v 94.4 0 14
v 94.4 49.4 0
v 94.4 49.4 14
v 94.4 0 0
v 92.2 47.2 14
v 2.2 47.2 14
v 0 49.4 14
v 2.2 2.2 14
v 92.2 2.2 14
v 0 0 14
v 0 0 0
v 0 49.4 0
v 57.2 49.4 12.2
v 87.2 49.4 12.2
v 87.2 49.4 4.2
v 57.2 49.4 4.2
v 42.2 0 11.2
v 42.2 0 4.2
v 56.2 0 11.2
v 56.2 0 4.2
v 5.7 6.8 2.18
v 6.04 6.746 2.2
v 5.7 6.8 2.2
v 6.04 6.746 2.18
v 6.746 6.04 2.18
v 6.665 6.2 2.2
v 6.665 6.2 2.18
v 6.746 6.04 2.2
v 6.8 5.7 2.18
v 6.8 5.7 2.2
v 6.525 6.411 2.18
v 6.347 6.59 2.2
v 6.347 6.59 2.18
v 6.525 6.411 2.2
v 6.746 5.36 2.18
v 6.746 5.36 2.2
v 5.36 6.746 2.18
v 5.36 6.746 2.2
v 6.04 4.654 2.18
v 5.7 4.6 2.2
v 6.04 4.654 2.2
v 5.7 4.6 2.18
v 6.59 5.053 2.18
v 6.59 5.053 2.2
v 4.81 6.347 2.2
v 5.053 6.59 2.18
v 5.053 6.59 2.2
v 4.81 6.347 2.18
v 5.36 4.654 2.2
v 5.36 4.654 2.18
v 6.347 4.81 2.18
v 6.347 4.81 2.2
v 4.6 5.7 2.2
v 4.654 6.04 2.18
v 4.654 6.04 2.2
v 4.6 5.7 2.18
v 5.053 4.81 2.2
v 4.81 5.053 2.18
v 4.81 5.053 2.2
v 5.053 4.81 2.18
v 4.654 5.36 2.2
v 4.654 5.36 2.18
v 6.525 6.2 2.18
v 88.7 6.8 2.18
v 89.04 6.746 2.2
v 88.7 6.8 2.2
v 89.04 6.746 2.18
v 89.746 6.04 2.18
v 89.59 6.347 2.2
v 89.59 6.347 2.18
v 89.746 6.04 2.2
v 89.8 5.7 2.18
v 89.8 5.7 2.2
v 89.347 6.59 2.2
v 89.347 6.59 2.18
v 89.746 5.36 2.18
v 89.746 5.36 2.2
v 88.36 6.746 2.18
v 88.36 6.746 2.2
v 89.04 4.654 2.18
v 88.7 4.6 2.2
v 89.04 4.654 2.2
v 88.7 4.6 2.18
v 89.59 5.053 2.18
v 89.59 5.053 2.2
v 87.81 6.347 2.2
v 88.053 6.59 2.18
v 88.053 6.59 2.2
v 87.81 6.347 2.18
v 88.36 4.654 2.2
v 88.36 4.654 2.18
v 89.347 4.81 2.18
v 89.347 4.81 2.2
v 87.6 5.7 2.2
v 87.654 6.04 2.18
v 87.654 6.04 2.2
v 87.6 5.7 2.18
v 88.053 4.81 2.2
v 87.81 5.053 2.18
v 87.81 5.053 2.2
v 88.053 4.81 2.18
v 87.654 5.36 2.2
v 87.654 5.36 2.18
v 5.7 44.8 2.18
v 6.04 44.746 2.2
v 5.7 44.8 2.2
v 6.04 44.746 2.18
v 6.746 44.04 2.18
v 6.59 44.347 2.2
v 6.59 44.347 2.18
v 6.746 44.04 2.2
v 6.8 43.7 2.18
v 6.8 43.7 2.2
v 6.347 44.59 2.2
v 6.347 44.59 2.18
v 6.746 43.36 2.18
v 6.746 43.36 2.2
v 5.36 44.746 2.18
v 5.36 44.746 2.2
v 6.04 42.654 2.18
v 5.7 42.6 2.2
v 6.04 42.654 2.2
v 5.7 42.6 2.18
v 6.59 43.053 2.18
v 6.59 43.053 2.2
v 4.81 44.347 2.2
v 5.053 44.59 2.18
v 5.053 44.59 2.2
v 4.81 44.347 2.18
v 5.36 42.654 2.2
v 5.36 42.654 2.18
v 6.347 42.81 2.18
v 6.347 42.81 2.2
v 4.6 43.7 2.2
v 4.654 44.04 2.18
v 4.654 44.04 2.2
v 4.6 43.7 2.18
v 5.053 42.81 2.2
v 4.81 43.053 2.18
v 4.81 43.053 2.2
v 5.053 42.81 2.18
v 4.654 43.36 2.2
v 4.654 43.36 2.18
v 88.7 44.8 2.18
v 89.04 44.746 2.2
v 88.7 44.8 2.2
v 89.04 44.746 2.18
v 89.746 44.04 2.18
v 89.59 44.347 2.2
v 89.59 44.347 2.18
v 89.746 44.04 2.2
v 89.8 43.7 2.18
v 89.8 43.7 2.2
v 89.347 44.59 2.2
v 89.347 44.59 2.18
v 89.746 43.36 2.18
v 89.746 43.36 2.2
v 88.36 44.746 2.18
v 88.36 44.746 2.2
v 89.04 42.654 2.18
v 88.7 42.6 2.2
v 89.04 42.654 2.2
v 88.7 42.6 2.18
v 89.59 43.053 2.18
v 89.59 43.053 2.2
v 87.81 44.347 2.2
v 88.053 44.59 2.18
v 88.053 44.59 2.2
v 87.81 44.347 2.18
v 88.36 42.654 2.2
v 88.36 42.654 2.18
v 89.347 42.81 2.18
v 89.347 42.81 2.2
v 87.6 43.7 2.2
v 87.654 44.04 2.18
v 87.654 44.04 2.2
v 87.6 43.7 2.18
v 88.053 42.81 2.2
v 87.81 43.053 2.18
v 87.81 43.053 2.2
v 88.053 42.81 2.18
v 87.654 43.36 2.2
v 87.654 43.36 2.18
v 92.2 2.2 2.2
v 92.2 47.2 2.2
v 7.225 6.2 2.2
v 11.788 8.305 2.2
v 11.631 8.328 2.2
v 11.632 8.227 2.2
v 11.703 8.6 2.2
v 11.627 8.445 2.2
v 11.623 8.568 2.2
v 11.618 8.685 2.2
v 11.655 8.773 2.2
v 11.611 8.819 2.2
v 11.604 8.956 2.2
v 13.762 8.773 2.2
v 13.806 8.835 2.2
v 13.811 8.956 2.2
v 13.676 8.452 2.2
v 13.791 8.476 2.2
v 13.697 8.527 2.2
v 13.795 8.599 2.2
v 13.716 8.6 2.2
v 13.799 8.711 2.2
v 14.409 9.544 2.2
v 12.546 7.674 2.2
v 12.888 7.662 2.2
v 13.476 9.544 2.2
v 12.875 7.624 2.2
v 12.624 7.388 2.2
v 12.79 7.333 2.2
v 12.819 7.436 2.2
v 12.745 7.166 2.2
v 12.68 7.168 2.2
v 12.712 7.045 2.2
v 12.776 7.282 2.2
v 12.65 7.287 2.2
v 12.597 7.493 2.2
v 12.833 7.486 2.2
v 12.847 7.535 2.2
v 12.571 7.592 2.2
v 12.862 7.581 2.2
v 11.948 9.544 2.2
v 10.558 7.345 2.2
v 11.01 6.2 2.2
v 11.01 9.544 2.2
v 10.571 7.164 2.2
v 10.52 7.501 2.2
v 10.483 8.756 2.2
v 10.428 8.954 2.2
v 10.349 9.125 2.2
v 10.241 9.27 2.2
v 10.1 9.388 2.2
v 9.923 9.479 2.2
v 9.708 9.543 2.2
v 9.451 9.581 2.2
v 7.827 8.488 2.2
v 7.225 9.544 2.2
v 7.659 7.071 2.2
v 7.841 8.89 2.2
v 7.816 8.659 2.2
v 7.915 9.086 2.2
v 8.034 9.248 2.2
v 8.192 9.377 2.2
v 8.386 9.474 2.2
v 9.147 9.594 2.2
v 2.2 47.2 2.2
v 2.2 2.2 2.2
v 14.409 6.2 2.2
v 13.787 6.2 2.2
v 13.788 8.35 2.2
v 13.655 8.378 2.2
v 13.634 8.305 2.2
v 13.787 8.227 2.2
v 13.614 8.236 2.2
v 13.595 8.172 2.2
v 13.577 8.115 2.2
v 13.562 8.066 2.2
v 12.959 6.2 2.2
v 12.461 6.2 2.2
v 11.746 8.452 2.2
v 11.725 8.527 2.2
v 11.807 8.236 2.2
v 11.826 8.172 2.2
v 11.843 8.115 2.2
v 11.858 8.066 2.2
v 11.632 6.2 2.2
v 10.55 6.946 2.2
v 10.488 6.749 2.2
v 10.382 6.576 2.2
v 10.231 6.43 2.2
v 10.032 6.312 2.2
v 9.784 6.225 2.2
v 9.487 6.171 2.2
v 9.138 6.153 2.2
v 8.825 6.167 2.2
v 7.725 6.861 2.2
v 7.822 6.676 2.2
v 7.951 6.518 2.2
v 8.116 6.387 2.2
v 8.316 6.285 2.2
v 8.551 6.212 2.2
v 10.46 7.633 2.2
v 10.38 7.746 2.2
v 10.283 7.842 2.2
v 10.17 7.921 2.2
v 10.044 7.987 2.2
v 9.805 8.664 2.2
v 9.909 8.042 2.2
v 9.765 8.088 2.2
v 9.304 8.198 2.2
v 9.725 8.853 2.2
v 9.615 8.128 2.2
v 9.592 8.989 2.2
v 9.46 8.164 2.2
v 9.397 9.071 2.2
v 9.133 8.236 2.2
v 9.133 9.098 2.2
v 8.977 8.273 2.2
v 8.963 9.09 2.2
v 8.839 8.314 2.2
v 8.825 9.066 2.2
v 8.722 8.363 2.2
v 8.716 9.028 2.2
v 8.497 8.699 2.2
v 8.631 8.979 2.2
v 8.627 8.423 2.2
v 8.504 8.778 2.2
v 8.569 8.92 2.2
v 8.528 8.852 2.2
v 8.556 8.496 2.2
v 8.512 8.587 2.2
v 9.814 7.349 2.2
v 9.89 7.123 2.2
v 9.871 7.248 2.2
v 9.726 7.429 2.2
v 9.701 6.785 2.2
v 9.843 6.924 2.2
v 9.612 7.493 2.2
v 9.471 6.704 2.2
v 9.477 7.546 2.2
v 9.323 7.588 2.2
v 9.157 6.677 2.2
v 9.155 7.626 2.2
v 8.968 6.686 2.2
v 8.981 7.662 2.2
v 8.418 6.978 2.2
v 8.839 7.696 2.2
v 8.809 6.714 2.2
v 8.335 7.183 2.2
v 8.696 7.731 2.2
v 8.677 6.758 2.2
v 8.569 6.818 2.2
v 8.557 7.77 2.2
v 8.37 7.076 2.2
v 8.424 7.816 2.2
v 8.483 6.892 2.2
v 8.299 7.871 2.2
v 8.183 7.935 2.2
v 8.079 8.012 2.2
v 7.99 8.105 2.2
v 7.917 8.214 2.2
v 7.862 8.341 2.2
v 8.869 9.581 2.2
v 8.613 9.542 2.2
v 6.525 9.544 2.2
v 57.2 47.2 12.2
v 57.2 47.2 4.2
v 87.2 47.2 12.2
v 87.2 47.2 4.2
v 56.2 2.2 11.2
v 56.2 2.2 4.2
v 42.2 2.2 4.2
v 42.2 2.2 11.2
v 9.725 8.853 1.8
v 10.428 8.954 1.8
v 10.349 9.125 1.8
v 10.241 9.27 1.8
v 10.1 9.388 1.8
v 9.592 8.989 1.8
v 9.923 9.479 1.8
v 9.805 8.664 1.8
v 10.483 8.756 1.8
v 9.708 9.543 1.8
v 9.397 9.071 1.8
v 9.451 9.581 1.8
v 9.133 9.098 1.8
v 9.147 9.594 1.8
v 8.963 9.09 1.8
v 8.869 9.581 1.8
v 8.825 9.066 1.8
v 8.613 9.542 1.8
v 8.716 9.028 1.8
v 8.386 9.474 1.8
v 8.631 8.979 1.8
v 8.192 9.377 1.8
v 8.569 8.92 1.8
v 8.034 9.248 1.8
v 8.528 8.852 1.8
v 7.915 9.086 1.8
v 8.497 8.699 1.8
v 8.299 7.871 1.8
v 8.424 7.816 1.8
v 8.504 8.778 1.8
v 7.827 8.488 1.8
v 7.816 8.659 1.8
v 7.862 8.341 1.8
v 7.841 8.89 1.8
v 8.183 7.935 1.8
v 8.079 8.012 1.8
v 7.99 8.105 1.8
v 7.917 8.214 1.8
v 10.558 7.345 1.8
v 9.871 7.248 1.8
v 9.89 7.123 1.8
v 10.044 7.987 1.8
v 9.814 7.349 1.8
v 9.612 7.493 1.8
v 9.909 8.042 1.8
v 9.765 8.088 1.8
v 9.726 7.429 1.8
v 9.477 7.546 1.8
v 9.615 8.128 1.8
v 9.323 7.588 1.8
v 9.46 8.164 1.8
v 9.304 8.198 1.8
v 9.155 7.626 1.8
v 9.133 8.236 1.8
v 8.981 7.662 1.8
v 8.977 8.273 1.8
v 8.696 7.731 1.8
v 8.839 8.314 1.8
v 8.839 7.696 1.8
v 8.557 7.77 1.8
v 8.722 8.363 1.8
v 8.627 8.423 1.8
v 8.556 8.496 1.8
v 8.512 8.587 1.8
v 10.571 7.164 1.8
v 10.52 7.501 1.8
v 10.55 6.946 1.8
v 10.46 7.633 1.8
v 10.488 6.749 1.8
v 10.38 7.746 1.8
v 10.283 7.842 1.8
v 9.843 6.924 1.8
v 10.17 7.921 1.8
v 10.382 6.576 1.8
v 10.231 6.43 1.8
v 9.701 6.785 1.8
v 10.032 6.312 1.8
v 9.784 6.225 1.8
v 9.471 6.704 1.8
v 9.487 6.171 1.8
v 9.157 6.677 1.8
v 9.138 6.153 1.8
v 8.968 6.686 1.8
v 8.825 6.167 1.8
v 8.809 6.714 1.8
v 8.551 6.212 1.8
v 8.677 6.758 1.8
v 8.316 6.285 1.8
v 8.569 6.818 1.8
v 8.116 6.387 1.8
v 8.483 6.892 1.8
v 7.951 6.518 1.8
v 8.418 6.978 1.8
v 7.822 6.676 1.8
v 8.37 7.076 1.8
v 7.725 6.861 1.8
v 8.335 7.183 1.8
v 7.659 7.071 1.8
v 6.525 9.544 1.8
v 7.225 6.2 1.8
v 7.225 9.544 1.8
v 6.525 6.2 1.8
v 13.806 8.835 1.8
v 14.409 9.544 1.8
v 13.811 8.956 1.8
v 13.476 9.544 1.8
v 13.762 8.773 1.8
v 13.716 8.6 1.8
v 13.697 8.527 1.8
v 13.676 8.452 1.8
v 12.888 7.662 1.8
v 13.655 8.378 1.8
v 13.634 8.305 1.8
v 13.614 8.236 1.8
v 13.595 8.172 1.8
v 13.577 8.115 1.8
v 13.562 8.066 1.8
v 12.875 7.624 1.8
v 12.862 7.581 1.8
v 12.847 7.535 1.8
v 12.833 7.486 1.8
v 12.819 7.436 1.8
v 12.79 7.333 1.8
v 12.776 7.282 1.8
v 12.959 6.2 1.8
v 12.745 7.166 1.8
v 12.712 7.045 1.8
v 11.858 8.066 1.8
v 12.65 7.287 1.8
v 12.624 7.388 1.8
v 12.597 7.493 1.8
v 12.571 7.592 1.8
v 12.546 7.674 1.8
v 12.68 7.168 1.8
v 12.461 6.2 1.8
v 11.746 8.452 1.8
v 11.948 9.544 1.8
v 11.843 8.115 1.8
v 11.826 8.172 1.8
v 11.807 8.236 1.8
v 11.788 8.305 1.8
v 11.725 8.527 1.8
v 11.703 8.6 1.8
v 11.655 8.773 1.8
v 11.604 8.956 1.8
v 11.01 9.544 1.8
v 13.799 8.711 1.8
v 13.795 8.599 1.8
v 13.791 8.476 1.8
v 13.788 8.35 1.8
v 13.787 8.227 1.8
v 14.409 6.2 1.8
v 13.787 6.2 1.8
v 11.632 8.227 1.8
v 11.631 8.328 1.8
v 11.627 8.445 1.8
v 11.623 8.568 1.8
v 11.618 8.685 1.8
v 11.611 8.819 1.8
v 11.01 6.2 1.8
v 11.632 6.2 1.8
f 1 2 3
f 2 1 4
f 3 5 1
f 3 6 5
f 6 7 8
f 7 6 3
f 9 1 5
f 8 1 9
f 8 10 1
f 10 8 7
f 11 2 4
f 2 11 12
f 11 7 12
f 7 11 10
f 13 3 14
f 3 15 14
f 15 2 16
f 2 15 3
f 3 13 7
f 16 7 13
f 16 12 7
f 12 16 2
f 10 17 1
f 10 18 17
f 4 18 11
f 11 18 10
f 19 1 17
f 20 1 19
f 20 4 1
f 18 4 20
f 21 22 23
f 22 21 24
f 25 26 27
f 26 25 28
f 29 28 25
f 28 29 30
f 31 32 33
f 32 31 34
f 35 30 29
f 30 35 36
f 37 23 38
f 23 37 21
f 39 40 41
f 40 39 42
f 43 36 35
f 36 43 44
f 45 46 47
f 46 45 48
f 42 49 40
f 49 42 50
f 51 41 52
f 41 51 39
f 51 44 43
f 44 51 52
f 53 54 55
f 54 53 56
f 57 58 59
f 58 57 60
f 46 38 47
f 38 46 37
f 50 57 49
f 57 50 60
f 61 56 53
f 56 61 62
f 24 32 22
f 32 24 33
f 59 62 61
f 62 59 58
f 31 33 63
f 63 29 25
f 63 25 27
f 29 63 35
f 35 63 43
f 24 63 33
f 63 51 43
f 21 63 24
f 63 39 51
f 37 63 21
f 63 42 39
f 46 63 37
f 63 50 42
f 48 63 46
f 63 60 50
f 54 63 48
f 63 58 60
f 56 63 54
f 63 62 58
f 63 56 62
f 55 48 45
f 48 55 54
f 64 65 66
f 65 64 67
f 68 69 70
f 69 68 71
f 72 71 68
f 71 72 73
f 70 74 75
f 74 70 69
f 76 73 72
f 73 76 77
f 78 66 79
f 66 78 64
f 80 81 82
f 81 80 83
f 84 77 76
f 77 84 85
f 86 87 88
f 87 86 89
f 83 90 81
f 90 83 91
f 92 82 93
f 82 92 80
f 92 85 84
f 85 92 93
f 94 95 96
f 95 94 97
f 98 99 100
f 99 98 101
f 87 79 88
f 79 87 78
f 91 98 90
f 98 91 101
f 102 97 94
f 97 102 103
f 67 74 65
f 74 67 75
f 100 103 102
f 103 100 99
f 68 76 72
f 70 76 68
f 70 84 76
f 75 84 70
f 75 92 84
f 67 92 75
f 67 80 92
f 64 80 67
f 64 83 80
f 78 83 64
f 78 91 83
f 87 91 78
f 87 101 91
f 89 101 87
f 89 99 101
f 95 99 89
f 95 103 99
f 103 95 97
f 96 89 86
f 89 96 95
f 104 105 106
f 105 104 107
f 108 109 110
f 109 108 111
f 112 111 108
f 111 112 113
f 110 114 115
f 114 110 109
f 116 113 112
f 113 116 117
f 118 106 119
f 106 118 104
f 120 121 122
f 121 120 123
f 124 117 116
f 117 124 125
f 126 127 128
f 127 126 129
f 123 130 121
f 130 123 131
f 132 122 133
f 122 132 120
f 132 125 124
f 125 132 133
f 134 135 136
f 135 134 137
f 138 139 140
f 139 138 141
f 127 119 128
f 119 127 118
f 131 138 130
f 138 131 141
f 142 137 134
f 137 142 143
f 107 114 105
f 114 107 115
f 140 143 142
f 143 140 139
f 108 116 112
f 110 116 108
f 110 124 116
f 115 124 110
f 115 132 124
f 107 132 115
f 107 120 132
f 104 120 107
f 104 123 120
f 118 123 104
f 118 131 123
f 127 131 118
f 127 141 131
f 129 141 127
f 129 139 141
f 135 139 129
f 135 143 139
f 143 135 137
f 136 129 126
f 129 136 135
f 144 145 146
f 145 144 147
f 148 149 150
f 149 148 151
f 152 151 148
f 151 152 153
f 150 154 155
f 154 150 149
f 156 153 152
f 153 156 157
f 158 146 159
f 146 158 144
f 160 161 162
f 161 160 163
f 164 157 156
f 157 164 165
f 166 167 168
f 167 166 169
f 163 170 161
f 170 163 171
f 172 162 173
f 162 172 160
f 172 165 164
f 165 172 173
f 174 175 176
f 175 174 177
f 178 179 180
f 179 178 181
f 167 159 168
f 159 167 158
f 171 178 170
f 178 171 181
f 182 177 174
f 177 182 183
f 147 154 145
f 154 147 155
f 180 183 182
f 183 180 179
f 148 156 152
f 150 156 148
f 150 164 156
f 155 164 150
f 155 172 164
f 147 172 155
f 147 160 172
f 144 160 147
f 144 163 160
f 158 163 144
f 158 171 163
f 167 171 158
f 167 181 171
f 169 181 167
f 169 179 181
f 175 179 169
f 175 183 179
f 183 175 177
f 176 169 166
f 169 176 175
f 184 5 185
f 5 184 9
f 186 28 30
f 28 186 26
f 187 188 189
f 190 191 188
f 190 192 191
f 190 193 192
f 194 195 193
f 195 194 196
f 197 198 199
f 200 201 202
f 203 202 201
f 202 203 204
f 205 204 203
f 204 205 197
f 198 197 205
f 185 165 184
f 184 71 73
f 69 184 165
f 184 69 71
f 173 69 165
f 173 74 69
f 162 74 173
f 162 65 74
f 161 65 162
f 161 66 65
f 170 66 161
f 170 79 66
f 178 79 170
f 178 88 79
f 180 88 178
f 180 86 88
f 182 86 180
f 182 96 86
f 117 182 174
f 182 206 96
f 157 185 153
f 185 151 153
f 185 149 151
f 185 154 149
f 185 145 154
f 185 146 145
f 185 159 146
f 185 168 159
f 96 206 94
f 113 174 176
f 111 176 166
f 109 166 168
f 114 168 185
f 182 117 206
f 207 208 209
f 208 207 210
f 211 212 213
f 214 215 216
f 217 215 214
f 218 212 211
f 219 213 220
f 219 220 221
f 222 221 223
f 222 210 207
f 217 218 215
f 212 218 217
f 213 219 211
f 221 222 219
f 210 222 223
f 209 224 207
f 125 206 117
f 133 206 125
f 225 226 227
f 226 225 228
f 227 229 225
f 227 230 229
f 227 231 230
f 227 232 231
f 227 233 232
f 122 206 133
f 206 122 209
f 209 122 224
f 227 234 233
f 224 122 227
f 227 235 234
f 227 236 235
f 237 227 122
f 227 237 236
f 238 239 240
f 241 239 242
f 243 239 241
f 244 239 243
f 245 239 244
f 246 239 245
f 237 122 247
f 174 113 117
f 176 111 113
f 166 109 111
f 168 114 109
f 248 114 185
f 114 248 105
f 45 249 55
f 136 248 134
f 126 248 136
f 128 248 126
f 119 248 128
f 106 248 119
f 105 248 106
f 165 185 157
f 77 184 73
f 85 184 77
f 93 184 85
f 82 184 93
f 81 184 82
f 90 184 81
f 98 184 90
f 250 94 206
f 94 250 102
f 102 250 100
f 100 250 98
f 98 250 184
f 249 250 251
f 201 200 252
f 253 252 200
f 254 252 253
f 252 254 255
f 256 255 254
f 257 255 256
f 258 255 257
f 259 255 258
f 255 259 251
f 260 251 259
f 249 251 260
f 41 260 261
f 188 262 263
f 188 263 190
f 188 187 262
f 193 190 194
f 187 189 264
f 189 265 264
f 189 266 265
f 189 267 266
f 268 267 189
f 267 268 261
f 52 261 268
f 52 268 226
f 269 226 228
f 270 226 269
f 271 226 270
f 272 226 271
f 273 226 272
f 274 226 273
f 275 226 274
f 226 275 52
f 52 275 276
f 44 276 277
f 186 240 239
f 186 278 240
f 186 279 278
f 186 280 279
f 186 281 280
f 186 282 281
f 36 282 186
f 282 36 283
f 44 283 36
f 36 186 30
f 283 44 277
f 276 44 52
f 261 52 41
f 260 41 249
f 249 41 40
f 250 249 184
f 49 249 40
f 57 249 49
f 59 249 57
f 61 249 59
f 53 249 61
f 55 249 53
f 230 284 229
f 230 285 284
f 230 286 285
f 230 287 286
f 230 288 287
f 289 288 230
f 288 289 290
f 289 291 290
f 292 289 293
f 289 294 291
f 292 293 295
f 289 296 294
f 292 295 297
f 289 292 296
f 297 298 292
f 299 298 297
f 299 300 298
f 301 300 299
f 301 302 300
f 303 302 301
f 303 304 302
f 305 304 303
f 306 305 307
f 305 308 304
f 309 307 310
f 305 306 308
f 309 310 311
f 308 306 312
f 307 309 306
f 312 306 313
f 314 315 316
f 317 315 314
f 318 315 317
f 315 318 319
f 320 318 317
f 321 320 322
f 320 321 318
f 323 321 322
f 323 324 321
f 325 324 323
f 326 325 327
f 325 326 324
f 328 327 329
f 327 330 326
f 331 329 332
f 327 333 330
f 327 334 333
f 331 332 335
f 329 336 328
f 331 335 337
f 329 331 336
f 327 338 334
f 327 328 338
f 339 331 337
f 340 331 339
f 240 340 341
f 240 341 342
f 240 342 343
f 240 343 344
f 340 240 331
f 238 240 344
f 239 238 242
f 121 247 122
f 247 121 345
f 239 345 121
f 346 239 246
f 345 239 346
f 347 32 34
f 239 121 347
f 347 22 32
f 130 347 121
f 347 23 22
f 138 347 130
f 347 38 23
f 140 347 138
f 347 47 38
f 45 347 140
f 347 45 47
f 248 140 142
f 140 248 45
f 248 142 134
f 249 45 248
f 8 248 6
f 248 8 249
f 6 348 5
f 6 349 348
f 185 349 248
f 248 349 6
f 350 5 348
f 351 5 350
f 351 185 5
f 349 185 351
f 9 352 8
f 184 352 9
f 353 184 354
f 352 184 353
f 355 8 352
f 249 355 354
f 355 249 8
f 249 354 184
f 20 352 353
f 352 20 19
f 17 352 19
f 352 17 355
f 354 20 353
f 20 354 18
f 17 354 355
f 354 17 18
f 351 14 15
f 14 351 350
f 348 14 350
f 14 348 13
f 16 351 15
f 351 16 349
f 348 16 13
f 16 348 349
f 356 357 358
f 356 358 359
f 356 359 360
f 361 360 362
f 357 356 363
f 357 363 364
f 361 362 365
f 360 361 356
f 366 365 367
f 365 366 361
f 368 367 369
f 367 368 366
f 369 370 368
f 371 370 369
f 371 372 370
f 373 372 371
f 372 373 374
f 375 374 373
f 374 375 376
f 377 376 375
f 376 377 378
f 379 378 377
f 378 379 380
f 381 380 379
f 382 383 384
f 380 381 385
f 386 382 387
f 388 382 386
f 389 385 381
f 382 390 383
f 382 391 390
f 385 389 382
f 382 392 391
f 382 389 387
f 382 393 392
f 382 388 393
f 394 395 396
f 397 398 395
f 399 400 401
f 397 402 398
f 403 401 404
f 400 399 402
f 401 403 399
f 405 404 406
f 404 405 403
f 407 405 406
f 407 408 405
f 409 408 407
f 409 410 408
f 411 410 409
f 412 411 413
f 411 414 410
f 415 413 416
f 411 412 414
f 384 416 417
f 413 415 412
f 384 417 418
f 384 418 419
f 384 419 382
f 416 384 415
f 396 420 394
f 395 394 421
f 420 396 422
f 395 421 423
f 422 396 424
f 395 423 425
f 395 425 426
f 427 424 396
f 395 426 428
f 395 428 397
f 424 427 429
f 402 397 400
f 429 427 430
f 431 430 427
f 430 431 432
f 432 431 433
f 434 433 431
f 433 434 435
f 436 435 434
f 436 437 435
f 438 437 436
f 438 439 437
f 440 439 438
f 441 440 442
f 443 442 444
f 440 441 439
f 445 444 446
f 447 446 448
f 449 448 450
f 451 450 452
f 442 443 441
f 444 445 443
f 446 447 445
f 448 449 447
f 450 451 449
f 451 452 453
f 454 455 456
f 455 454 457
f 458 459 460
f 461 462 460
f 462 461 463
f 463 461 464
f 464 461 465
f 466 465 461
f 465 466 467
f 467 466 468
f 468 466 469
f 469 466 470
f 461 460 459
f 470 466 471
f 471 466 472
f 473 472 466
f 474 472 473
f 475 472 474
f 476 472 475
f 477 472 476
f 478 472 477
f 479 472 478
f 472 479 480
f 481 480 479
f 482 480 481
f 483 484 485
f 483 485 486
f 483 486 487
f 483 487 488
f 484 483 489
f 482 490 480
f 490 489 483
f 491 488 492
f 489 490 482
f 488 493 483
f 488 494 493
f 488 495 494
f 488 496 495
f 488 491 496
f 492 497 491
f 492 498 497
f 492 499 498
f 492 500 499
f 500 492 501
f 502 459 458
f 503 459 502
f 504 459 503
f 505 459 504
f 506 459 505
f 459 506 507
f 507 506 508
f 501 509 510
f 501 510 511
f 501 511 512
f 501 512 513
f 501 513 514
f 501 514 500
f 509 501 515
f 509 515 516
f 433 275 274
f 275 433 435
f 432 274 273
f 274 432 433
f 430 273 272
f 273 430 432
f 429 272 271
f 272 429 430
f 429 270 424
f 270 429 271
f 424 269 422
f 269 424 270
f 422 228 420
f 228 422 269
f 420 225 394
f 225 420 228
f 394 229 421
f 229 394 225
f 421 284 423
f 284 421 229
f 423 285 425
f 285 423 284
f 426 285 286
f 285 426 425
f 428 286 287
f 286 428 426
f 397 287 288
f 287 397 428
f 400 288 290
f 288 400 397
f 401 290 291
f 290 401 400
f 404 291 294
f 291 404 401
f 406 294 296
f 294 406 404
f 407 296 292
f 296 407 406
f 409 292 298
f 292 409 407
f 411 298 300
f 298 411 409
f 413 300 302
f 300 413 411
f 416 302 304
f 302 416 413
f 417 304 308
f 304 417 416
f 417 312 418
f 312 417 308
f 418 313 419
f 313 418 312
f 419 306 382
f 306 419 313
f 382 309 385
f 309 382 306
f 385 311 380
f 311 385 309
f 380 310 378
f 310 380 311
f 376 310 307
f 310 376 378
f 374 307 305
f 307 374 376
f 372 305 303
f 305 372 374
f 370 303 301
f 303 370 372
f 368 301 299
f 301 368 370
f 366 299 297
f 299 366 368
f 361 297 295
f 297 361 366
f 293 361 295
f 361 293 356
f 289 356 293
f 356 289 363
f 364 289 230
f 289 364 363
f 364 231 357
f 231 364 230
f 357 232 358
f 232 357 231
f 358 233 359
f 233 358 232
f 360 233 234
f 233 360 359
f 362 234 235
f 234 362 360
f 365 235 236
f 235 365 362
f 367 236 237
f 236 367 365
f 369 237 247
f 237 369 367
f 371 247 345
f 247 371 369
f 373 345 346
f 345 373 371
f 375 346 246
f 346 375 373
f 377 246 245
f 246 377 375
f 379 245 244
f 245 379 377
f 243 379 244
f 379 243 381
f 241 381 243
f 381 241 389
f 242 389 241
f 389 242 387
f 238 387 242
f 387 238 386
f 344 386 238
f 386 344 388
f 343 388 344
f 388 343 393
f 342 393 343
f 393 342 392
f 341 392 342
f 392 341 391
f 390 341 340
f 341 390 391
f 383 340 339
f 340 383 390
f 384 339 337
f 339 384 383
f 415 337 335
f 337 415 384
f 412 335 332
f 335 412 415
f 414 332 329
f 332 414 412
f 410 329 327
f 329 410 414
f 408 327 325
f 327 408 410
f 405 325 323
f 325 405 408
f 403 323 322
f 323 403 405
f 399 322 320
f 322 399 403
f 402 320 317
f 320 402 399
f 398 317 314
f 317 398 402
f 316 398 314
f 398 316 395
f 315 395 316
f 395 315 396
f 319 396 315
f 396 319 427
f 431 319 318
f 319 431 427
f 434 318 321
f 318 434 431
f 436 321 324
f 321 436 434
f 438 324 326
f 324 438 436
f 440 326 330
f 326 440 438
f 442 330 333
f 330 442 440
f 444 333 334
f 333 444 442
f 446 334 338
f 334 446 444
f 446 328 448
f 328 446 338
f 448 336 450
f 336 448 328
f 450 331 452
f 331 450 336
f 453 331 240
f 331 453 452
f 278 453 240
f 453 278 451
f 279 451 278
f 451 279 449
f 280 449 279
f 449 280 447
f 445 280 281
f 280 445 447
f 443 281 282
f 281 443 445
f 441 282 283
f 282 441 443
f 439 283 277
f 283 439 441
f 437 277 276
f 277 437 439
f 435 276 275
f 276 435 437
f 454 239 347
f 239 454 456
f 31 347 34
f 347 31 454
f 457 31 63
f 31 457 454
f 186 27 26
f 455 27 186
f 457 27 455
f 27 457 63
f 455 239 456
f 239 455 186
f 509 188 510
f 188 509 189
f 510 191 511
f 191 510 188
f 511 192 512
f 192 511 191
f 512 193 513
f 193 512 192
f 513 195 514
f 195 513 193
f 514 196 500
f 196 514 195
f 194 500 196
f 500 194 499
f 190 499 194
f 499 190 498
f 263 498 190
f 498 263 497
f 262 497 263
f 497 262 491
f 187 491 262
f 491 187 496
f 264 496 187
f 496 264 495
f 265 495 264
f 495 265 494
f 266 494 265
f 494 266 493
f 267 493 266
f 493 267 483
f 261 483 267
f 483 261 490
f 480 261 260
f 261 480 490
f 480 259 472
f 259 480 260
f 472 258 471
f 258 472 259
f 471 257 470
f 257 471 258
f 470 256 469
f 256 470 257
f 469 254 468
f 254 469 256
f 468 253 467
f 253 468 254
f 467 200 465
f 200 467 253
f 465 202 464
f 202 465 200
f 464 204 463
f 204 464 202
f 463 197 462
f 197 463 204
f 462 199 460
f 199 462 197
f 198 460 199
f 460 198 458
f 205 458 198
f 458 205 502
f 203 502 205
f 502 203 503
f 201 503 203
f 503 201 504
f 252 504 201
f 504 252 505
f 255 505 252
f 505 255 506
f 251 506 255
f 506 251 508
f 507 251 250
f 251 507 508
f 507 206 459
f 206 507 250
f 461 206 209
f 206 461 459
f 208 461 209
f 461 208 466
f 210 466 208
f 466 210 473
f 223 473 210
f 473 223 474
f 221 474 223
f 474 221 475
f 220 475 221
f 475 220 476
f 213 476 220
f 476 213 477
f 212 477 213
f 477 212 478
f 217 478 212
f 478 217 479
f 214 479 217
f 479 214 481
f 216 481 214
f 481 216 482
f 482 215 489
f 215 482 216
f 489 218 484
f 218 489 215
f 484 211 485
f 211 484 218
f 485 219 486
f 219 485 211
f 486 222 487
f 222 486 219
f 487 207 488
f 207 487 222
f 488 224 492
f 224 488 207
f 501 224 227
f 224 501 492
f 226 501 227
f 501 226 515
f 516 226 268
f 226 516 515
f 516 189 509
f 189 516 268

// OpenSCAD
// ISM SATA / SATA carrier shell (original ISM) — 2.5" bay style
pcb_w = 90;
pcb_d = 45;
wall = 2.2;
box_h = 14;
eps = 0.02;
mount_d = 2.2;
badge_depth = 0.4;

mounts = [[3.5, 3.5], [pcb_w - 3.5, 3.5], [3.5, pcb_d - 3.5], [pcb_w - 3.5, pcb_d - 3.5]];

module carrier() {
  difference() {
    union() {
      cube([pcb_w + 2 * wall, pcb_d + 2 * wall, box_h]);
      for (p = mounts)
        translate([p[0] + wall, p[1] + wall, wall - eps])
          cylinder(h = 4 + eps, d = 5, $fn = 24);
    }
    translate([wall, wall, wall])
      cube([pcb_w, pcb_d, box_h - wall + eps]);
    // USB-C
    translate([wall + 40, -eps, wall + 2])
      cube([14, wall + 4, 7]);
    // SATA data / drive bay opening
    translate([wall + 55, wall + pcb_d - 1, wall + 2])
      cube([30, wall + 3, 8]);
    // Drive power header
    translate([wall + 72, wall + pcb_d - 1, wall + 4])
      cube([12, wall + 3, 6]);
    for (p = mounts)
      translate([p[0] + wall, p[1] + wall, wall - eps])
        cylinder(h = 8 + 2 * eps, d = mount_d, $fn = 20);
    translate([wall + 4, wall + 4, wall - badge_depth])
      linear_extrude(height = badge_depth + eps)
        text("ISM", size = 3.5, font = "Liberation Sans:style=Bold");
  }
}

module lid() {
  difference() {
    cube([pcb_w + 2 * wall, pcb_d + 2 * wall, 2.5]);
    translate([4, 4, 2.5 - badge_depth])
      linear_extrude(height = badge_depth + eps)
        text("SATA", size = 4, font = "Liberation Sans:style=Bold");
  }
}

carrier();
